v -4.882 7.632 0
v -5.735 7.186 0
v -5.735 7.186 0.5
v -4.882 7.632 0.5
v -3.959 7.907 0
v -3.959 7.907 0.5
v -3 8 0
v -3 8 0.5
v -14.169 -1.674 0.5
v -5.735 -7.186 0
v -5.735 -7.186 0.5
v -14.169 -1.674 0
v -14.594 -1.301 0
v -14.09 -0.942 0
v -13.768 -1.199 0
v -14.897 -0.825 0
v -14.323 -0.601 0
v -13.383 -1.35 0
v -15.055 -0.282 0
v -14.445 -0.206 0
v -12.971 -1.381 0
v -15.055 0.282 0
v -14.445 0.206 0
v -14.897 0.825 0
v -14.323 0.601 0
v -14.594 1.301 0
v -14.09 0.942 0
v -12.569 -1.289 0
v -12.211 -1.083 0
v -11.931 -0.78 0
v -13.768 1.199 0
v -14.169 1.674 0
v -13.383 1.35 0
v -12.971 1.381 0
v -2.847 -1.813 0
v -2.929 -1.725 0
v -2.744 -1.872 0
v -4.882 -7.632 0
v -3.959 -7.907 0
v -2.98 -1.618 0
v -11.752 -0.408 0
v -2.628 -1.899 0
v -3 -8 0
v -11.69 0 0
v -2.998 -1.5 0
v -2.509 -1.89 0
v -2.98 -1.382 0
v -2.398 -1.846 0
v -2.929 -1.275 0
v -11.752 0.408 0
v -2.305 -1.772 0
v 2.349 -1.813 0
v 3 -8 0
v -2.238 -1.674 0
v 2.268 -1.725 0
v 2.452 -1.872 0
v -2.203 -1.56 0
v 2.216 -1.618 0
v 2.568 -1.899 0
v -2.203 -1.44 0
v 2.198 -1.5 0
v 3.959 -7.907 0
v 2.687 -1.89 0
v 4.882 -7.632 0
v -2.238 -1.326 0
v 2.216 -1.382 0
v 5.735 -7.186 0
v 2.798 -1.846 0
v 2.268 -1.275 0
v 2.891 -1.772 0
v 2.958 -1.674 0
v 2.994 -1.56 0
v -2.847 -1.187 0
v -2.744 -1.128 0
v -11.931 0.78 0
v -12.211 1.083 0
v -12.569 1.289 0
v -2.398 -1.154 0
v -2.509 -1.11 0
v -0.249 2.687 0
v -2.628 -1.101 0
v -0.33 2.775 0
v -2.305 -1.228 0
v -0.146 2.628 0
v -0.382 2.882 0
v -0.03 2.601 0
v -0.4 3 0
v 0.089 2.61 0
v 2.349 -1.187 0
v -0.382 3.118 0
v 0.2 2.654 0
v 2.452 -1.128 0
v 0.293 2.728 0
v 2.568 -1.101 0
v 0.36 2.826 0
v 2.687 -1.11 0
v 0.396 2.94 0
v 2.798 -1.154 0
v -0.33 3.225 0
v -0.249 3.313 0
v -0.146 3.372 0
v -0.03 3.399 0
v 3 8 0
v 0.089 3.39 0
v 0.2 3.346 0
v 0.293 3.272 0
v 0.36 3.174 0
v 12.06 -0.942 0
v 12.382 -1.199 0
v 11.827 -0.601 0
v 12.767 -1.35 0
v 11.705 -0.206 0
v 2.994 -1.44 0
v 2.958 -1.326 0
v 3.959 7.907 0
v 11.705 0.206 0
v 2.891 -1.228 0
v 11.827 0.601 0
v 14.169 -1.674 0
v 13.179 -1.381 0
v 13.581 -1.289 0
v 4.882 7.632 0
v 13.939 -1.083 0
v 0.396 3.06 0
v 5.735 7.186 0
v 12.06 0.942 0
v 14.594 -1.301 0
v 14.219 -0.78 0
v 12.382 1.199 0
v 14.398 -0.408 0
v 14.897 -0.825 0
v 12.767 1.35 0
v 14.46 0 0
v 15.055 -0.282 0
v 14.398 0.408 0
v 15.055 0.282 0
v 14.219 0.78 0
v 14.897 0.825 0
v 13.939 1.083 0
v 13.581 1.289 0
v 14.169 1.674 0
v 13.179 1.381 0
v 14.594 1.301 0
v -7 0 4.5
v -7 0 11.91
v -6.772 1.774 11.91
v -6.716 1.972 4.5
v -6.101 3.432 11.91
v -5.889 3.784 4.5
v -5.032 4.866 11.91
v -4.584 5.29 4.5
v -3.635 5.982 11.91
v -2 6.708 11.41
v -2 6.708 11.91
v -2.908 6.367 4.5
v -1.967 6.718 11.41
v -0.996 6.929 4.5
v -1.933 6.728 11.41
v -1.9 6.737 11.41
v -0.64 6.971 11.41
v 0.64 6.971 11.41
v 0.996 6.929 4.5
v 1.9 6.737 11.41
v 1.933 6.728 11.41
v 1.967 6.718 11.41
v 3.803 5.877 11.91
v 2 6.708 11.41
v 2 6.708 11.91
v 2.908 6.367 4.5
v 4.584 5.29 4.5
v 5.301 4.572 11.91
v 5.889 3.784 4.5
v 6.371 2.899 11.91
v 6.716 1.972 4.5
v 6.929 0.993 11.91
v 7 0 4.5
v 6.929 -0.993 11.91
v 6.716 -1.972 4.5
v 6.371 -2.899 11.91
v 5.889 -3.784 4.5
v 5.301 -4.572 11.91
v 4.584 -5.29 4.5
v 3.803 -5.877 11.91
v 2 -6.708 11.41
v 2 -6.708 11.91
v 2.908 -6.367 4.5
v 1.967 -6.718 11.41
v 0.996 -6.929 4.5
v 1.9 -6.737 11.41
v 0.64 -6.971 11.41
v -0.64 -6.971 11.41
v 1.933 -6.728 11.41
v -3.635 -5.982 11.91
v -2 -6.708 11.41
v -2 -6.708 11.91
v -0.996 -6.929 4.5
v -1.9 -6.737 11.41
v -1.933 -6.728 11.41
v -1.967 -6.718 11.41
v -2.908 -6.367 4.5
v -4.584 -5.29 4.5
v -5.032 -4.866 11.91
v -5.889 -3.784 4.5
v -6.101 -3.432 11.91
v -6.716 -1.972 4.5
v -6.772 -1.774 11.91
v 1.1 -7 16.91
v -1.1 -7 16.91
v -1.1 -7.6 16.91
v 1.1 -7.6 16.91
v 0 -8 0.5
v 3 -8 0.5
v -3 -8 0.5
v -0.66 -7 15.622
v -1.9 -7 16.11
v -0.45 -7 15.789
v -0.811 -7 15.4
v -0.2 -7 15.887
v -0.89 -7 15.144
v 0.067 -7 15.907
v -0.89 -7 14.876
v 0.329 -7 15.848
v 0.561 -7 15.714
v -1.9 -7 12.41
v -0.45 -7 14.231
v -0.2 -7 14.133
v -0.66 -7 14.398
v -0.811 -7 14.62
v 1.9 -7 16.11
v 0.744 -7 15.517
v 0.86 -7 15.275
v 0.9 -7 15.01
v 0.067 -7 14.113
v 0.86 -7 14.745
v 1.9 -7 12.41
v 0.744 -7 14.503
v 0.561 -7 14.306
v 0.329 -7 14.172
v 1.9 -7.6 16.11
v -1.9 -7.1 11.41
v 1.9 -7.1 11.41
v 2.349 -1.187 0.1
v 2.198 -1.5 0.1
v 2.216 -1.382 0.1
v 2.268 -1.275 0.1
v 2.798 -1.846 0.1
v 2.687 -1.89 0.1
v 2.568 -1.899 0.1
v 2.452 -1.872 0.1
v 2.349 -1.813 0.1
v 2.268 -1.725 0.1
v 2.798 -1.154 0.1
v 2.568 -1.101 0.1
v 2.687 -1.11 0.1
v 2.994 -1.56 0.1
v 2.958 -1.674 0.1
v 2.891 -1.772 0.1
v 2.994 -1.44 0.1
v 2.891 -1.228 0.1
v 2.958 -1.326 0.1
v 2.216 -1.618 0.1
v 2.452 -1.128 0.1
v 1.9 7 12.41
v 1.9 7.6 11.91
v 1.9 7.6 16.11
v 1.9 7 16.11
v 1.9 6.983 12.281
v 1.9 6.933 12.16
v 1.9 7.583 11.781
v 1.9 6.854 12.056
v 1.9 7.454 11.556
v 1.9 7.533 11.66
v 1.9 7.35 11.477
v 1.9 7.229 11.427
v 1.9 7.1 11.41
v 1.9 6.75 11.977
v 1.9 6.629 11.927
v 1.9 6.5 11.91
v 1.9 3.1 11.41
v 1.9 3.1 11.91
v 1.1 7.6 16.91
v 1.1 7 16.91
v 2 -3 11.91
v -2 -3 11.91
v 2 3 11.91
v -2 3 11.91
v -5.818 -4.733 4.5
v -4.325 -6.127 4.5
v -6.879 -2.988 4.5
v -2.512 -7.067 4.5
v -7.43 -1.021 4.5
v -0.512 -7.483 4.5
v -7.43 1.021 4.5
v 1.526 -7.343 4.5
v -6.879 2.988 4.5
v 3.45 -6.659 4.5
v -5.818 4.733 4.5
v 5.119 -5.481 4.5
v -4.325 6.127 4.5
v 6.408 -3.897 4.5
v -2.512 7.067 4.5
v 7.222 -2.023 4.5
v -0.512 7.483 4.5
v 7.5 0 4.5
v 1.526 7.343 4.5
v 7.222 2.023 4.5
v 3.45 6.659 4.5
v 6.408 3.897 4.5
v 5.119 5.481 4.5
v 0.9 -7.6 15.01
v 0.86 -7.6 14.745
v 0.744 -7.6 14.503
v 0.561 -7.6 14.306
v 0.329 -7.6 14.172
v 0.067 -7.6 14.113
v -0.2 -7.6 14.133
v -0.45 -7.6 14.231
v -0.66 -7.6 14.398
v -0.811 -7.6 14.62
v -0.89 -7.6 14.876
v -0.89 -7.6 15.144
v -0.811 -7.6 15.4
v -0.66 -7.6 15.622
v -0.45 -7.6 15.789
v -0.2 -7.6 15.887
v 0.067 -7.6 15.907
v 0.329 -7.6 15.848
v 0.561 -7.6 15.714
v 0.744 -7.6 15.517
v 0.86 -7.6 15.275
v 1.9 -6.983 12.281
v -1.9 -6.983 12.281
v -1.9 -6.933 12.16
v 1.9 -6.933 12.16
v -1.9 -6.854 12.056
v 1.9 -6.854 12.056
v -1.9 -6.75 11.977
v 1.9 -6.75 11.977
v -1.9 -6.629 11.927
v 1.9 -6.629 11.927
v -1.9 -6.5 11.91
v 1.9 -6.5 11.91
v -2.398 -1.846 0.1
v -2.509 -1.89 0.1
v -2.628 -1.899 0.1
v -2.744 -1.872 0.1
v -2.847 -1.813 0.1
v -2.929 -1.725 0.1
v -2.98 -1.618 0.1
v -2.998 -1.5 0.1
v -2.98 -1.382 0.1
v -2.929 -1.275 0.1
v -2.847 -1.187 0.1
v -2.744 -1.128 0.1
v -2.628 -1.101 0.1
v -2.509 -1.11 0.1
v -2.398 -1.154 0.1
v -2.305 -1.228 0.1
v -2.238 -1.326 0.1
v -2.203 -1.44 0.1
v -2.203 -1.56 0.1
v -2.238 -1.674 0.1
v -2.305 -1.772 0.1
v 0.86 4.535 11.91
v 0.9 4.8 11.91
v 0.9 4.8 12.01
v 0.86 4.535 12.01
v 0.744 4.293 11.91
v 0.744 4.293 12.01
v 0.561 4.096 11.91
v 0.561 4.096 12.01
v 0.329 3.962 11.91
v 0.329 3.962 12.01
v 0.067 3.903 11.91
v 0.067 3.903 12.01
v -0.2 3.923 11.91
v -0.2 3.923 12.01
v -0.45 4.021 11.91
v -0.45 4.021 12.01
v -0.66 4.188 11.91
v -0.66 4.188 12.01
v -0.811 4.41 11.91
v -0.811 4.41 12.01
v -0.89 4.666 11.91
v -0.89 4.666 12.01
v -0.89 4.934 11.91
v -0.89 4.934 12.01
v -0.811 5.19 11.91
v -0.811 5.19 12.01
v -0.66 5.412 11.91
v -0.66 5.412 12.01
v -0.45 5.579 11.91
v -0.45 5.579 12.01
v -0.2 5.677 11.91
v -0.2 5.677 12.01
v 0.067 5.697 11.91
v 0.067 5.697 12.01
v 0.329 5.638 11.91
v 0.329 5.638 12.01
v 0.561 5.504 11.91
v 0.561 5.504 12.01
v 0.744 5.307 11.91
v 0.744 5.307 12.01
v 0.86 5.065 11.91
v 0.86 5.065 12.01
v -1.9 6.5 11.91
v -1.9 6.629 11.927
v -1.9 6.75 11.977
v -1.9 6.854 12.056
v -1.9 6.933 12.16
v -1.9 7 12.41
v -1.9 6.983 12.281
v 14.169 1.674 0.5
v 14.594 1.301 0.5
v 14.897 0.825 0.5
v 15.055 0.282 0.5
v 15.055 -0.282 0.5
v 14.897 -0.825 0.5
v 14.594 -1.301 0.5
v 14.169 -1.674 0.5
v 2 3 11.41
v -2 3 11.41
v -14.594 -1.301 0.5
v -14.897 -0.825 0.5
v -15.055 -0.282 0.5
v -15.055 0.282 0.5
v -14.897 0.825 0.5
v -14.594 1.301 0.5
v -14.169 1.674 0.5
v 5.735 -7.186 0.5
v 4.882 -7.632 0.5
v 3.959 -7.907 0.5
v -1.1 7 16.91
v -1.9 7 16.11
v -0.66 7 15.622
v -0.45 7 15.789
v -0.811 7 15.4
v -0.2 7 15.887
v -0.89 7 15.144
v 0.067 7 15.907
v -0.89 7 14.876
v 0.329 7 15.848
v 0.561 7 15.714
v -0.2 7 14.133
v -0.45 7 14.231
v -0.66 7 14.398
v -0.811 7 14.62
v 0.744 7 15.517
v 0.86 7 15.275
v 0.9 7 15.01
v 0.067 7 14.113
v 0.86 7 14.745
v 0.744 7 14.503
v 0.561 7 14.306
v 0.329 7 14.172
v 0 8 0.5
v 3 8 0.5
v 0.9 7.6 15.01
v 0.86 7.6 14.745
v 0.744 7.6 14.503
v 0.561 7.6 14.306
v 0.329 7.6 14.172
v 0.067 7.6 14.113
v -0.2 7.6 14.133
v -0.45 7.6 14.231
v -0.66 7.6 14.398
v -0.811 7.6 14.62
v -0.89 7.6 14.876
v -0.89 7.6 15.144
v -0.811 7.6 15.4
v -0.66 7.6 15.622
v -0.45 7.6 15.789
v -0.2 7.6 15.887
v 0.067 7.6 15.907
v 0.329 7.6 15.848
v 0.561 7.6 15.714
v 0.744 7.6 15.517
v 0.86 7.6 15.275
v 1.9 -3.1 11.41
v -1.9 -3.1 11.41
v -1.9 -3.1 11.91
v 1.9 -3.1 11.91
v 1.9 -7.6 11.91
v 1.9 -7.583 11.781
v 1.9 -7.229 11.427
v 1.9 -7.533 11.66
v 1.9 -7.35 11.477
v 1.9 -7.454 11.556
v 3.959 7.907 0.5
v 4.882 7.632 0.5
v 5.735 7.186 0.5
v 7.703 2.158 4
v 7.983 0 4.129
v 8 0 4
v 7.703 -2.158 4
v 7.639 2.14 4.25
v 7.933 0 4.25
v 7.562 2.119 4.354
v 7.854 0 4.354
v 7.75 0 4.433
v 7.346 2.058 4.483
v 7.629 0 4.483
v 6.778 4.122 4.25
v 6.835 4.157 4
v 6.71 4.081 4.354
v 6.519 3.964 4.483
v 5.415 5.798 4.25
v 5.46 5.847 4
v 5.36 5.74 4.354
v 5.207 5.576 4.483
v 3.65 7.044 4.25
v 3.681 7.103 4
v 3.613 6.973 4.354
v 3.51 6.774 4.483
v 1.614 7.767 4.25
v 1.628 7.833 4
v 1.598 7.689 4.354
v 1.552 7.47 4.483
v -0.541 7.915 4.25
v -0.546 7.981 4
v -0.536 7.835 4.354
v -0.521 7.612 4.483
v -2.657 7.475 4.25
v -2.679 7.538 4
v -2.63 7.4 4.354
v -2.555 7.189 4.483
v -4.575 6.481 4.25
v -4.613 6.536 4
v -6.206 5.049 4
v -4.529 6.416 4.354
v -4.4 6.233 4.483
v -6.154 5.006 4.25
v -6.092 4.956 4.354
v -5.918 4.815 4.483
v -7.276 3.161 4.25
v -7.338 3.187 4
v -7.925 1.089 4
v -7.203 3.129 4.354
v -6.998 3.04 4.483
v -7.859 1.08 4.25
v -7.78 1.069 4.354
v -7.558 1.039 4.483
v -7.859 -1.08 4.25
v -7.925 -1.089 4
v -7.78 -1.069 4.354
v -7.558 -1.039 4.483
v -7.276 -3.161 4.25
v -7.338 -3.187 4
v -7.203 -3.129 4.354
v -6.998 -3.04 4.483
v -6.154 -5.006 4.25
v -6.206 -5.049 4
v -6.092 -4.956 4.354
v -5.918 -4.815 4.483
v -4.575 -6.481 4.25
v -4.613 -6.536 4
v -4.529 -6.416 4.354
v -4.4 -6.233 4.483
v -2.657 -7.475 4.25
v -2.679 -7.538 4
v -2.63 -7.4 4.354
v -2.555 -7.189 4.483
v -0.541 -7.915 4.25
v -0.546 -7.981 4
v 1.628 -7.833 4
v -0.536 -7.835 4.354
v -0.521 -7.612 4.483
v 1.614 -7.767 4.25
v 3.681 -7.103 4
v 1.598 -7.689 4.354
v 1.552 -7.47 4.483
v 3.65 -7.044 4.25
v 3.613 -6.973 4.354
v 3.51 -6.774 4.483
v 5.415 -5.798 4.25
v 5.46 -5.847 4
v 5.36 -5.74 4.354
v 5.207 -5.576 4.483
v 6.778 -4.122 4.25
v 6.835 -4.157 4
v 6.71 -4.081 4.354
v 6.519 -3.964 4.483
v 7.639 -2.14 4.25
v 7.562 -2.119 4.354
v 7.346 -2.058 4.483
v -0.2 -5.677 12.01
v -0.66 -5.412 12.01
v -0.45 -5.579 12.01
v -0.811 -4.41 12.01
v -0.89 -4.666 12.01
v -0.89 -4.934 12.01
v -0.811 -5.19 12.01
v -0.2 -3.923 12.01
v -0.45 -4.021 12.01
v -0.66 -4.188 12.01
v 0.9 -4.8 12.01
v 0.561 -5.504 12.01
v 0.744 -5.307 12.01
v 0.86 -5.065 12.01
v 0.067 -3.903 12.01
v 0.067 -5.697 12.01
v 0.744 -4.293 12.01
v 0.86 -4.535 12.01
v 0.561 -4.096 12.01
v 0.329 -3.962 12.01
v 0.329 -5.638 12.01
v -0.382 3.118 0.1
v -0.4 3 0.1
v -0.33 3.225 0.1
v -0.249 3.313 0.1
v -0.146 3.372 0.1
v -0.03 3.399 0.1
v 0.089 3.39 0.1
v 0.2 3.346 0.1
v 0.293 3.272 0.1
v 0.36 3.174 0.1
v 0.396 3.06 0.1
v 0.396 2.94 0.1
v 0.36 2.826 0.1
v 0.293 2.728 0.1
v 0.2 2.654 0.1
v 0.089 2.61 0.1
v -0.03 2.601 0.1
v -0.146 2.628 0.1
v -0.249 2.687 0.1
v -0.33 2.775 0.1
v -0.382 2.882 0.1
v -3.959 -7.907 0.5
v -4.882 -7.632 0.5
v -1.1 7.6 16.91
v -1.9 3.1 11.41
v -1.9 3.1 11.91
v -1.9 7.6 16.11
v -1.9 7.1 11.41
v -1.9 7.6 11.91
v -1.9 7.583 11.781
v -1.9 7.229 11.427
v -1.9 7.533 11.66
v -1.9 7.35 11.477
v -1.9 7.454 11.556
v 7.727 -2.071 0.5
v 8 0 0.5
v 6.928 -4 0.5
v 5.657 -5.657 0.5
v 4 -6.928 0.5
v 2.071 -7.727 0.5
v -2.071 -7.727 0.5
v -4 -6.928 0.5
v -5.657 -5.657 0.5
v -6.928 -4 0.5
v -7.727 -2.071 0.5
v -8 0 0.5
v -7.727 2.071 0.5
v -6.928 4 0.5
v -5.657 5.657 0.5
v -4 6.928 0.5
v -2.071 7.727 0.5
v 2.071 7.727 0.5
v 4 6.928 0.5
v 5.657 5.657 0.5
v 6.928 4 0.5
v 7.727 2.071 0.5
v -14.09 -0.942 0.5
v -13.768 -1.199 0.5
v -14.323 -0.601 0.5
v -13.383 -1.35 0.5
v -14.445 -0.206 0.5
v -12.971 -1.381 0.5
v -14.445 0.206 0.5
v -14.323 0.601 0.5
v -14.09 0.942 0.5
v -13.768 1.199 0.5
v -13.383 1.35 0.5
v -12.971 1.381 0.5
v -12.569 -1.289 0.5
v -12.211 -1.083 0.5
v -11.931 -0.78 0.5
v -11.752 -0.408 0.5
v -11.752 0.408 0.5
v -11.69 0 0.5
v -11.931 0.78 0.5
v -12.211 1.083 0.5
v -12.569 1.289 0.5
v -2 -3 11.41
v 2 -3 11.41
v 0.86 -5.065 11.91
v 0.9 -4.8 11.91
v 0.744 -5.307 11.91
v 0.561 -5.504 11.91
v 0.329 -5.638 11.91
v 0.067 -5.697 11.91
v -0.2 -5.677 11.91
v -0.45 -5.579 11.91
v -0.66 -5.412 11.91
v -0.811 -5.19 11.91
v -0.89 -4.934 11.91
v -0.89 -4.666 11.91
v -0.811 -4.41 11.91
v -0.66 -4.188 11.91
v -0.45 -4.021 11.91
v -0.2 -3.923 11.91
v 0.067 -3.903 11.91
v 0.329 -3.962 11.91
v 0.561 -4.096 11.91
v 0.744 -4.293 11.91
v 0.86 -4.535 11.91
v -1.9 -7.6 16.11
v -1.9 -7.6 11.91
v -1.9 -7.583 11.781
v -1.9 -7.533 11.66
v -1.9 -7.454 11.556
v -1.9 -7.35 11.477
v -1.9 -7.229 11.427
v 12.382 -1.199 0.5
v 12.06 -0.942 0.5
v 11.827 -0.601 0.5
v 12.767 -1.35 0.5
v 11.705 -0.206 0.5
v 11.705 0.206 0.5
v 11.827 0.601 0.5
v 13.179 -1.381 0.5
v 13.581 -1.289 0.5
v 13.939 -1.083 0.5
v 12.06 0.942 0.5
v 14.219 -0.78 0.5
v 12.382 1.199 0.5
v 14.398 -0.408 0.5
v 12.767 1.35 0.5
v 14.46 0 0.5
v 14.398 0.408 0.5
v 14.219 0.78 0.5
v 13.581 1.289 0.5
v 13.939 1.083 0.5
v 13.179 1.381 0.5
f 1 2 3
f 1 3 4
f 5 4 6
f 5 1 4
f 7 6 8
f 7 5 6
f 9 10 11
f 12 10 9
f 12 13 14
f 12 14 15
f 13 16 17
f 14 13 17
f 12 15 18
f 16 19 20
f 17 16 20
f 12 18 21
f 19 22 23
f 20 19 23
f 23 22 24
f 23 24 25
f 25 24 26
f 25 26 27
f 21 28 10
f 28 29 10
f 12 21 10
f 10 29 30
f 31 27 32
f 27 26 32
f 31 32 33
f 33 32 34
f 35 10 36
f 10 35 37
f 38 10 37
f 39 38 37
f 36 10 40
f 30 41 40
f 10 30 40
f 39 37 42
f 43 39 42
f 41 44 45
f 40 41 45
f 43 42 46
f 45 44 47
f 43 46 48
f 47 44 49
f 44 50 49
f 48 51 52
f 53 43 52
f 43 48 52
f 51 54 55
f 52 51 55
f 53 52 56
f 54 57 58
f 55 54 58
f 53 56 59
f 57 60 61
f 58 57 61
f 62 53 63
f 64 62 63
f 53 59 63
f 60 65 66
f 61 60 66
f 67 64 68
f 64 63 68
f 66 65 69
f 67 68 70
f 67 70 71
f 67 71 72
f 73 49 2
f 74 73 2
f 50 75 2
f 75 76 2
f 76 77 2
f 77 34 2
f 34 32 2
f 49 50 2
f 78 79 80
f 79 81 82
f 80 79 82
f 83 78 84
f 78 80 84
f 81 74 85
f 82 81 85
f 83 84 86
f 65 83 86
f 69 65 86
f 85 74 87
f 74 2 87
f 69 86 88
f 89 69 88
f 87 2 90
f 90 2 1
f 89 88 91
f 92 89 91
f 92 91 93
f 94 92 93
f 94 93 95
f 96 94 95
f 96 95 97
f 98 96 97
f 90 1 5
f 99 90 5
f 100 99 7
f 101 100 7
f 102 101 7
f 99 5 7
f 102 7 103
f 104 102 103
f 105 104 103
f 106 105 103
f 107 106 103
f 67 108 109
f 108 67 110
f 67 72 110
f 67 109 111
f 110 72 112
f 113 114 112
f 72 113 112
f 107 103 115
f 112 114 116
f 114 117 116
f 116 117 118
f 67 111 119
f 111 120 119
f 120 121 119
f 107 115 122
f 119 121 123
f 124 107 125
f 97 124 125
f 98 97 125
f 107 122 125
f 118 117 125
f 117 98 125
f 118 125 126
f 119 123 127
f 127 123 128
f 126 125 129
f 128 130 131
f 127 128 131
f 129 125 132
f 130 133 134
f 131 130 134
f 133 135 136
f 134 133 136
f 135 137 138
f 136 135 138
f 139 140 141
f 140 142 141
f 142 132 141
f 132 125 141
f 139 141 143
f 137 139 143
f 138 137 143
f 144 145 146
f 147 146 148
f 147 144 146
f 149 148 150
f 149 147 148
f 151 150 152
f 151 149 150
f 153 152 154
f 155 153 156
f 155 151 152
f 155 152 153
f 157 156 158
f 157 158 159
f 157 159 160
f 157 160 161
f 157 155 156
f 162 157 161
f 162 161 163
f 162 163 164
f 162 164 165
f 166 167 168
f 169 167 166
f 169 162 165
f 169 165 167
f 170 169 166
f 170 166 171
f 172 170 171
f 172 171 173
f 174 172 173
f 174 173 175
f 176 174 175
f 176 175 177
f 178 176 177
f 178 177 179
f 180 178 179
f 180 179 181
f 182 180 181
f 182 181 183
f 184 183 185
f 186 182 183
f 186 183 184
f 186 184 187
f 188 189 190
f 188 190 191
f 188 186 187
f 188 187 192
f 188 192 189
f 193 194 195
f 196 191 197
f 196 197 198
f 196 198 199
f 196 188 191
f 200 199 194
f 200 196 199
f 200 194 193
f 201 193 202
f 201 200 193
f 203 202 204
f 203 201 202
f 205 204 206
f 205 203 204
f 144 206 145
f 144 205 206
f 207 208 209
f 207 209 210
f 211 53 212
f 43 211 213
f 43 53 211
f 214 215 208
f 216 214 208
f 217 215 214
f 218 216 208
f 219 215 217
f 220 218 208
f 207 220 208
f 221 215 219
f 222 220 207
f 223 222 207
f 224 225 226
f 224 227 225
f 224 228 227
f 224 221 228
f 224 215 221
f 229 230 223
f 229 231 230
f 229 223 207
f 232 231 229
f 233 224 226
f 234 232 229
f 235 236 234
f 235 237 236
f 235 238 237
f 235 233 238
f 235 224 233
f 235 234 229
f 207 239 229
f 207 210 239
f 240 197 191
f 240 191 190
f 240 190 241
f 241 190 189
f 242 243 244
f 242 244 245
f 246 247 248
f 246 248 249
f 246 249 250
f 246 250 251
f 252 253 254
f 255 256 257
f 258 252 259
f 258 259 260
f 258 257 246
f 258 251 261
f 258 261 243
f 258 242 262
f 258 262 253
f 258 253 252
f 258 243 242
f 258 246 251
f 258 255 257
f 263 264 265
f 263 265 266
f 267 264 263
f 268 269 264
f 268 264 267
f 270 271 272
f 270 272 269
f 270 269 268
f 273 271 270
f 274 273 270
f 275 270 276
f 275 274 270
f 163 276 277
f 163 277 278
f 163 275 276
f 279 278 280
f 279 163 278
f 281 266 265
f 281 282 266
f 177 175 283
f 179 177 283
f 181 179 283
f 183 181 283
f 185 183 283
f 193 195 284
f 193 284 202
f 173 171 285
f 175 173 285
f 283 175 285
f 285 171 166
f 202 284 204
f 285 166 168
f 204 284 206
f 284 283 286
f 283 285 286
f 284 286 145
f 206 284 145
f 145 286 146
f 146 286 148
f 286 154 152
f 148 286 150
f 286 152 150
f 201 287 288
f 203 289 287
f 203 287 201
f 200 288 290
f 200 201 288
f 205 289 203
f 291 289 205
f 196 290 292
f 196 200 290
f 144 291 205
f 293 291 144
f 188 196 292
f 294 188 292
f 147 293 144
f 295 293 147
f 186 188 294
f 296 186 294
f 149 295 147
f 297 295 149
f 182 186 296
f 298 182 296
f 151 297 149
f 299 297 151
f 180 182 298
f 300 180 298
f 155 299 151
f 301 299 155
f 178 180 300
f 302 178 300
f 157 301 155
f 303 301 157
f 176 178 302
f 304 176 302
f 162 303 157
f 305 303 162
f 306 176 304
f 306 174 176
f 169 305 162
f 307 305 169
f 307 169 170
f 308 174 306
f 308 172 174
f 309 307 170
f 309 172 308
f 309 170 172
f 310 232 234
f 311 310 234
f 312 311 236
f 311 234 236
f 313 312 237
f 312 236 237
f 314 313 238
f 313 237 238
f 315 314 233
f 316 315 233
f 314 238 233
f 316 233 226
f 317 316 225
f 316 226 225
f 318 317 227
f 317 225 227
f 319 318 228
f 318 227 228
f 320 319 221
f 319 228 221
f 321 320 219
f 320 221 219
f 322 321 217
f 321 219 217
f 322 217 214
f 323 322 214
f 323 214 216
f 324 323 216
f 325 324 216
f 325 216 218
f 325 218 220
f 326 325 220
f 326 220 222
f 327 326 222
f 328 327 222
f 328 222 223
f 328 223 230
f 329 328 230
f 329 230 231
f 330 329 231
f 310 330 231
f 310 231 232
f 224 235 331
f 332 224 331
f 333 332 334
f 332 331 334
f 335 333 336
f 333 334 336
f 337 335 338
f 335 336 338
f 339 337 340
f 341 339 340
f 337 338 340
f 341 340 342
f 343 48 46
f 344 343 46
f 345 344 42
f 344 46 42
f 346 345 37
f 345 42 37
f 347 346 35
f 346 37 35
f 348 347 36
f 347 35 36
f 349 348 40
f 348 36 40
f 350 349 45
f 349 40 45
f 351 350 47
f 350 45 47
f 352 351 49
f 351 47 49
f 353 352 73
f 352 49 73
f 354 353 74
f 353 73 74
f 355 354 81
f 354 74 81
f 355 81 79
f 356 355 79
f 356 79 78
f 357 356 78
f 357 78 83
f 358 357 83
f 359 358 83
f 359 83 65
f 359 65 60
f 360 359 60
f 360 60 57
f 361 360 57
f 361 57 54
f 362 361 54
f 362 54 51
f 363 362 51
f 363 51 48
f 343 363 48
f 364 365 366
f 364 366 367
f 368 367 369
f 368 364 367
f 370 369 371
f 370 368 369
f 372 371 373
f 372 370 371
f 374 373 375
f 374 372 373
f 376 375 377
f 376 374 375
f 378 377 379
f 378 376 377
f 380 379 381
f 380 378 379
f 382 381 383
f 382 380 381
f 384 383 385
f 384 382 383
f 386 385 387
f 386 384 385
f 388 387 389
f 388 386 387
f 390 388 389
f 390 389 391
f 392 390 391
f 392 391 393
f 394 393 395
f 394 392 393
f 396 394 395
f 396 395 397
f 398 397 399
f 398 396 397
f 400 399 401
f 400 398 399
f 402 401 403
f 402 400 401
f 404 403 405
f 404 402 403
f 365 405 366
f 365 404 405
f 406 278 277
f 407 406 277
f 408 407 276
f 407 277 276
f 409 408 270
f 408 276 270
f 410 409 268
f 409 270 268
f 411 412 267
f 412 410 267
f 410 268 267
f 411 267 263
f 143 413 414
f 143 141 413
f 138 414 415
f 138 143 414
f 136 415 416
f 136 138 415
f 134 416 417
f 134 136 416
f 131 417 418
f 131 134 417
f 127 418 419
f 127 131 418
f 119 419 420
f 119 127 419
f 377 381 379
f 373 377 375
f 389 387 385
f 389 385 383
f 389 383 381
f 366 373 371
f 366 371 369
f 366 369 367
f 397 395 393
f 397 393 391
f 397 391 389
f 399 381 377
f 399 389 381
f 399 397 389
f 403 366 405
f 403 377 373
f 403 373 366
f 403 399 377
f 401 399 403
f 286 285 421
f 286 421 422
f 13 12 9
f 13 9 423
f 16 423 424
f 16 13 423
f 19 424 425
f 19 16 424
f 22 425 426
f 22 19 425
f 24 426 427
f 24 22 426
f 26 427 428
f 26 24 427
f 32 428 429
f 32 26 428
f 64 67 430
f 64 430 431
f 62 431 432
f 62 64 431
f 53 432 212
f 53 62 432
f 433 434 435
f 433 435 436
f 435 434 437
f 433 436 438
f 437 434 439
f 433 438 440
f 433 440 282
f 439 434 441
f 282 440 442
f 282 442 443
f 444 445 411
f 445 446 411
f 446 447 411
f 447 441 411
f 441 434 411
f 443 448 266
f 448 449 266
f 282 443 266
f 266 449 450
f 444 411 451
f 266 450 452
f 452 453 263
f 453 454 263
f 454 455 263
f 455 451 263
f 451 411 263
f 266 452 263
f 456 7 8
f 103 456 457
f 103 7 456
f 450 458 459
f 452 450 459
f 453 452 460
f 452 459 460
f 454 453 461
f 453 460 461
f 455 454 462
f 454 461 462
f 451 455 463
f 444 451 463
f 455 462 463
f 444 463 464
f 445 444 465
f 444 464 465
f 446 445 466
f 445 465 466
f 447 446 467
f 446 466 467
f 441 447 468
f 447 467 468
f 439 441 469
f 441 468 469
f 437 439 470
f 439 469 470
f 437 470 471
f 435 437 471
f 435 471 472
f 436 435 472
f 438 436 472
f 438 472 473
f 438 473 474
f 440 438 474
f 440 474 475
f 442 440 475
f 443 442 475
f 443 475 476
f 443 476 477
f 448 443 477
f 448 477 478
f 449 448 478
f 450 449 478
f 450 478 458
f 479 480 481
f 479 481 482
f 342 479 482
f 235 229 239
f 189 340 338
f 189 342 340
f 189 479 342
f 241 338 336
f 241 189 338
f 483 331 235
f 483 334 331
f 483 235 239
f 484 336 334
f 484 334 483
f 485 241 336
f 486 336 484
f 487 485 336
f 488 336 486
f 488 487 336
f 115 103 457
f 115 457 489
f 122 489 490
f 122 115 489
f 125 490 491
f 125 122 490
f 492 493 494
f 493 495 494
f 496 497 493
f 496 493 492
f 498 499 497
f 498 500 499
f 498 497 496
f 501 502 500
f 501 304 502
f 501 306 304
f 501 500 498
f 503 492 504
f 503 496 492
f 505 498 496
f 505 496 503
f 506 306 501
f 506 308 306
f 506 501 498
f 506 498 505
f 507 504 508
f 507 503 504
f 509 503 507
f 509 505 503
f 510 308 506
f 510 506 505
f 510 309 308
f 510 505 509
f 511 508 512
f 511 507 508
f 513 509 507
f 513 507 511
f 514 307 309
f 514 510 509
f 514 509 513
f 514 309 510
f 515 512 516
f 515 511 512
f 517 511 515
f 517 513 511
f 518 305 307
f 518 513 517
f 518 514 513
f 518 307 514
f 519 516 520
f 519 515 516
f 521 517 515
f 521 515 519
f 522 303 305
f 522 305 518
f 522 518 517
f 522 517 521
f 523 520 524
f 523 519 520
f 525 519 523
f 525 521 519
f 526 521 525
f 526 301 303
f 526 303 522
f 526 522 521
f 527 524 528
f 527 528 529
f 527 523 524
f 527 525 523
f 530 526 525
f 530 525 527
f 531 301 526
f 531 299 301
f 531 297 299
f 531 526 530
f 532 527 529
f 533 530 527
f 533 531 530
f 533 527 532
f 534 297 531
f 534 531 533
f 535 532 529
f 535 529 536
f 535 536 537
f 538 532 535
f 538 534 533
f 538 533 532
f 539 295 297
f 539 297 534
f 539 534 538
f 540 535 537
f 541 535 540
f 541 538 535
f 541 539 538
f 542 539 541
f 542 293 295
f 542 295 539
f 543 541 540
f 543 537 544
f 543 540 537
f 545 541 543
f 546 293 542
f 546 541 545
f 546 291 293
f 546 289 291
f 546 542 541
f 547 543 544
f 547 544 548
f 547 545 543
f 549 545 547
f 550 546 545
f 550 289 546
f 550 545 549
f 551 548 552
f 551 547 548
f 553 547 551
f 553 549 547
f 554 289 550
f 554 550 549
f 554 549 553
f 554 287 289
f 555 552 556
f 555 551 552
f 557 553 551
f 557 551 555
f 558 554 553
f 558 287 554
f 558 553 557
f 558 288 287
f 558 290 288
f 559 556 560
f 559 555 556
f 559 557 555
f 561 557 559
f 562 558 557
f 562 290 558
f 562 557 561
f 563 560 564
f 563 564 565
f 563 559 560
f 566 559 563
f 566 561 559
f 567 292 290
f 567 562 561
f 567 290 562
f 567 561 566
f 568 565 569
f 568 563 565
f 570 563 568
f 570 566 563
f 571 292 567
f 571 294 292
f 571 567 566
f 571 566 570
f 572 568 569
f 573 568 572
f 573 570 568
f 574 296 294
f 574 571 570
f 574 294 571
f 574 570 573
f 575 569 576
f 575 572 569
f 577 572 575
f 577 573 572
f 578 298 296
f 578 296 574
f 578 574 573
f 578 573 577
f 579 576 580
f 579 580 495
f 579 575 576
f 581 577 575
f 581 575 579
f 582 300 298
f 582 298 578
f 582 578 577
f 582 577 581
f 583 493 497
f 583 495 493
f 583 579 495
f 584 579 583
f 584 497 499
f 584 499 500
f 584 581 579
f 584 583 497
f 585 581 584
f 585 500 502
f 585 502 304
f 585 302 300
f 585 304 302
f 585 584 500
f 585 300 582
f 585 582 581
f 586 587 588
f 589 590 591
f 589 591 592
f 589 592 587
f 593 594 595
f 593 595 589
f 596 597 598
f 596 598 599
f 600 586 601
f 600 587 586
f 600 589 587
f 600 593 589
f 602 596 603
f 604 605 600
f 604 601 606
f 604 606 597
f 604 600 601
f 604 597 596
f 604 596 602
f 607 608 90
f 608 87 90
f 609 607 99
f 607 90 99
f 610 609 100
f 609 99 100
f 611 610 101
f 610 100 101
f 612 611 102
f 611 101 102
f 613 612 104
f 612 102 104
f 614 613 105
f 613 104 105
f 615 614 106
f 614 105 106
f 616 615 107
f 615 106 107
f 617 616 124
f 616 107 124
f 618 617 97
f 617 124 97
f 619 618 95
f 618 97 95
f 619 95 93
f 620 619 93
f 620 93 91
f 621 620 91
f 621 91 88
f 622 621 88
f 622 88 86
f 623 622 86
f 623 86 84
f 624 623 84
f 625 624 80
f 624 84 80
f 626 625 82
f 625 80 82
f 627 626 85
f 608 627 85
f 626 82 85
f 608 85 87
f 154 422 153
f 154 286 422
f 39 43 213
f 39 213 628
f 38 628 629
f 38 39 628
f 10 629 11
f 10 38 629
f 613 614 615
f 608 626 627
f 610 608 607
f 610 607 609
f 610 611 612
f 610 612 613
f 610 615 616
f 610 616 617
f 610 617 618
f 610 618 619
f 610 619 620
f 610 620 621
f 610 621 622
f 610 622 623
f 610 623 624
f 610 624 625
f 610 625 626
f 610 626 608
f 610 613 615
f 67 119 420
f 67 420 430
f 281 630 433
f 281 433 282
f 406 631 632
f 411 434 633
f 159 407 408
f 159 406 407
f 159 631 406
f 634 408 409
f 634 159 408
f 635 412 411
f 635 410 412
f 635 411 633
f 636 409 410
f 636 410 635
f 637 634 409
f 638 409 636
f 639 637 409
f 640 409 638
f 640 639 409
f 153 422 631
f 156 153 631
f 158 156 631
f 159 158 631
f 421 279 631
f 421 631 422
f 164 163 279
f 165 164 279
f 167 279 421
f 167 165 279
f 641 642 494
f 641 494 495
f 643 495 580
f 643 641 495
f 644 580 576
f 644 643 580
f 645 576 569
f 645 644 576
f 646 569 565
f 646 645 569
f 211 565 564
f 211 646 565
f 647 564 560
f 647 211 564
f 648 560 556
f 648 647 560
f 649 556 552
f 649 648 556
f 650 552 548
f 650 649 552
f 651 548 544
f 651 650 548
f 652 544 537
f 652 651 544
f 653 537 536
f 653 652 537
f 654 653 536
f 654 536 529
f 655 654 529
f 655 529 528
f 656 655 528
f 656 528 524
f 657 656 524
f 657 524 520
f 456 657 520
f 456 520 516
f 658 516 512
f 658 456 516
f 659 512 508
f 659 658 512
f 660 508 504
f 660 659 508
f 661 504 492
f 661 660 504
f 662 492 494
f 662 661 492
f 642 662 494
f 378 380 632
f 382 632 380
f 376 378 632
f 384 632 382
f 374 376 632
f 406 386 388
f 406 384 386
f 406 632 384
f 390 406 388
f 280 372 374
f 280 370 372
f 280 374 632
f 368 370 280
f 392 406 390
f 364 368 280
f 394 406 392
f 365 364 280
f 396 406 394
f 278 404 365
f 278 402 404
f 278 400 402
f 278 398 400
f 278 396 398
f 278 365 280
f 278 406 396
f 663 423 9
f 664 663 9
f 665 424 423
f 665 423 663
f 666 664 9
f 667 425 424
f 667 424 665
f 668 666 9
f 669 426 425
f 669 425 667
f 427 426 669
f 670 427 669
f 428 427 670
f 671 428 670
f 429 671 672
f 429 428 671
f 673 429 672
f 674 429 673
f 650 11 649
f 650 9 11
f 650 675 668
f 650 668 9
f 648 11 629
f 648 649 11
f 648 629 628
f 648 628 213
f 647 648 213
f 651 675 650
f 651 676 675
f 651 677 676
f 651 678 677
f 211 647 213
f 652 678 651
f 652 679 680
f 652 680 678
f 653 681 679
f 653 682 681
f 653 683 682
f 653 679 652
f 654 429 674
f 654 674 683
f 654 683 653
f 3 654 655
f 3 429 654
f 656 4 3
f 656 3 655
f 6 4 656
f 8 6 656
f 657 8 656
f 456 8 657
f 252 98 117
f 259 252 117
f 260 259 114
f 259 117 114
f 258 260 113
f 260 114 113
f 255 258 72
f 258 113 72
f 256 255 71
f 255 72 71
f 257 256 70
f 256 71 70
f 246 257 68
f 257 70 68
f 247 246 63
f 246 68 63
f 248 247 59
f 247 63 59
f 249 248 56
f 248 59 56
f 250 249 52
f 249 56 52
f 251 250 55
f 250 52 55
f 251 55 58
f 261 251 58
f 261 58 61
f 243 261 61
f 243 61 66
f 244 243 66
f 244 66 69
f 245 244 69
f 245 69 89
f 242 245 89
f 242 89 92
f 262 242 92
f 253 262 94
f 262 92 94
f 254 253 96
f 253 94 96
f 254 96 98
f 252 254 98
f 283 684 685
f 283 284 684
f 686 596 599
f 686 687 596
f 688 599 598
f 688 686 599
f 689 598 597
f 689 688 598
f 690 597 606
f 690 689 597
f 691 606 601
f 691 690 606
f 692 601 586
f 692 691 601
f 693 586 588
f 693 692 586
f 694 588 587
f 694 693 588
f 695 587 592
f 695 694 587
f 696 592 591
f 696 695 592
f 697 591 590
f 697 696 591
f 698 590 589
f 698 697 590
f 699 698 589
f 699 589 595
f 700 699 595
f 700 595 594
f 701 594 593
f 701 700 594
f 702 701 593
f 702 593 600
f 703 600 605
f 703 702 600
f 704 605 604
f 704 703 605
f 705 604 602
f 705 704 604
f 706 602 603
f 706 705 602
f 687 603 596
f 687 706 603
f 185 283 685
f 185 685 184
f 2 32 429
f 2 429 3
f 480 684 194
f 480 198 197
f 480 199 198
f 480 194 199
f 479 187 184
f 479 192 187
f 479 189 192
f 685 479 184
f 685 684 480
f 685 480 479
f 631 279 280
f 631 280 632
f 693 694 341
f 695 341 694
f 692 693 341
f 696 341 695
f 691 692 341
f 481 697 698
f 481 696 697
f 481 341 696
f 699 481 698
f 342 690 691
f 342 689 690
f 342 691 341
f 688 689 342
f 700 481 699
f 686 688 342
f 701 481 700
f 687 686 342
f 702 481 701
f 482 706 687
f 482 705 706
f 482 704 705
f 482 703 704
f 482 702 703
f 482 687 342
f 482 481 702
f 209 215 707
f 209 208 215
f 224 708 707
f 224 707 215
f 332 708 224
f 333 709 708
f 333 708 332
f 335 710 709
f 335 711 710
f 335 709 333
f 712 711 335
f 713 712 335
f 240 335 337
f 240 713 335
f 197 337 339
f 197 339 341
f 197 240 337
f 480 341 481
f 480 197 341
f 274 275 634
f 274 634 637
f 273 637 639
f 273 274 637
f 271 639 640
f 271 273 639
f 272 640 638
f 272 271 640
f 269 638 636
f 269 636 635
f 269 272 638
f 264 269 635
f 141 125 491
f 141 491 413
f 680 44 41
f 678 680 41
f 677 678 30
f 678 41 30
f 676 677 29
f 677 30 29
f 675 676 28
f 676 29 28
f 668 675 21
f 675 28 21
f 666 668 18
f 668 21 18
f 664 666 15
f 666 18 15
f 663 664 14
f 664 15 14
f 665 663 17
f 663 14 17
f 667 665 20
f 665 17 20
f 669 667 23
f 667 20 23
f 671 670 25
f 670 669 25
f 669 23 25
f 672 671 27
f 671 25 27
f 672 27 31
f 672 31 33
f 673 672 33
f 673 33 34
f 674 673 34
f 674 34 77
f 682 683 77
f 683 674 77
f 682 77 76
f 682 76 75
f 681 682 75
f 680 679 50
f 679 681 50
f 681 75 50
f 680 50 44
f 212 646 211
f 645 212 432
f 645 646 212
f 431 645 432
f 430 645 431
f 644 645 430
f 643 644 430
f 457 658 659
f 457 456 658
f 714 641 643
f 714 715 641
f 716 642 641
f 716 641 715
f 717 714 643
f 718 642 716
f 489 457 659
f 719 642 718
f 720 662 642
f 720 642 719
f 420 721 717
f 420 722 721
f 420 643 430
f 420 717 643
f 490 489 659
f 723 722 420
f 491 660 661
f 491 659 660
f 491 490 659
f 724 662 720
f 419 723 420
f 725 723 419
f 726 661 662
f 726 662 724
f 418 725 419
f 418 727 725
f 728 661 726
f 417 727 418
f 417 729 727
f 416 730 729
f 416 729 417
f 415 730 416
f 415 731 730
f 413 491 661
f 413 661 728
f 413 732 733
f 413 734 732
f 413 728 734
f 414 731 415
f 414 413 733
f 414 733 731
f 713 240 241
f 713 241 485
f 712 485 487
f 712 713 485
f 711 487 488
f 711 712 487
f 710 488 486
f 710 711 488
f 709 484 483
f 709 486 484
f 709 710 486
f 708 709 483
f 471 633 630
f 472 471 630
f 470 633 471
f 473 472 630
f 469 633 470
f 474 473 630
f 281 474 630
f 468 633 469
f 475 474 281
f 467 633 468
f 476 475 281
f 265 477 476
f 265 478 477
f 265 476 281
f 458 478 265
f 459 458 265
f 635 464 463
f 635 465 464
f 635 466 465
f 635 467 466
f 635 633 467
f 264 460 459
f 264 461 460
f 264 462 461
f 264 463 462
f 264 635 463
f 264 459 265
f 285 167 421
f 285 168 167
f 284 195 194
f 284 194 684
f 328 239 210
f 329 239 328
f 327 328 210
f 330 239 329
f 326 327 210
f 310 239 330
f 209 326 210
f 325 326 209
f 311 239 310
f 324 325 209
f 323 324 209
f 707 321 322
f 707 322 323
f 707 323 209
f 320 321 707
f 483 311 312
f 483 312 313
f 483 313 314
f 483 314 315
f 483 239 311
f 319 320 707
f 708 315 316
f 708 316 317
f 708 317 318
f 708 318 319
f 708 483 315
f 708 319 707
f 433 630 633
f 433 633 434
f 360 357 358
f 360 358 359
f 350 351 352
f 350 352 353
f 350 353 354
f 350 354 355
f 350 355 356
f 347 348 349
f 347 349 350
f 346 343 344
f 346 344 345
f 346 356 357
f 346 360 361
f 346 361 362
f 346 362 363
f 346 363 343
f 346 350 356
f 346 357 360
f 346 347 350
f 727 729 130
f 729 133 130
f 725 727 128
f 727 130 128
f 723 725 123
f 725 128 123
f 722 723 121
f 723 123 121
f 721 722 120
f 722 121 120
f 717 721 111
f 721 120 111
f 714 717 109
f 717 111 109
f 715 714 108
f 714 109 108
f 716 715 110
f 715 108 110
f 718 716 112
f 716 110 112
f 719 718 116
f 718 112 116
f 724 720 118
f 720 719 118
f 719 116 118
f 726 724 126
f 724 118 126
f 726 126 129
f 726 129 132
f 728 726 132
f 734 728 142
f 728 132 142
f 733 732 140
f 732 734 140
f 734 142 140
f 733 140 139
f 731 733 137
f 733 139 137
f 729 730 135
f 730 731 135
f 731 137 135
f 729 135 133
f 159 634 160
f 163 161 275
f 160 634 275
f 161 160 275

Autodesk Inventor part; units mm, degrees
ref_plane "YZ Plane" through (0, 0, 0) normal (1, 0, 0) x (0, 1, 0)
ref_plane "XZ Plane" through (0, 0, 0) normal (0, 1, 0) x (-1, 0, 0)
ref_plane "XY Plane" through (0, 0, 0) normal (0, 0, 1) x (1, 0, 0)
sketch "Skizze1" plane through (0, 0, 0) normal (0, 0, 1) x (1, 0, 0)
  line L0 (-3, 8) -> (3, 8)
  line L1 (5.7352, 7.1856) -> (14.1691, 1.6742)
  line L2 (14.1691, -1.6742) -> (5.7352, -7.1856)
  line L3 (3, -8) -> (-3, -8)
  line L4 (-5.7352, -7.1856) -> (-14.1691, -1.6742)
  line L5 (-14.1691, 1.6742) -> (-5.7352, 7.1856)
  arc A0 (14.1691, -1.6742) -> (14.1691, 1.6742) centre (13.075, 0) ccw
  arc A1 (-14.1691, 1.6742) -> (-14.1691, -1.6742) centre (-13.075, 0) ccw
  circle A2 centre (0, 0) radius 7
  circle A3 centre (-13.075, 0) radius 1.385
  circle A4 centre (13.075, 0) radius 1.385
  arc A5 (-3, 8) -> (-5.7352, 7.1856) centre (-3, 3) ccw
  arc A6 (5.7352, 7.1856) -> (3, 8) centre (3, 3) ccw
  arc A7 (3, -8) -> (5.7352, -7.1856) centre (3, -3) ccw
  arc A8 (-5.7352, -7.1856) -> (-3, -8) centre (-3, -3) ccw
  dimension "d0" = 16
  dimension "d1" = 8
  dimension "d3" = 2
  dimension "d4" = 14
  dimension "d5" = 30.15
  dimension "d7" = 2.77
  dimension "d8" = 2.77
  dimension "d9" = 13.075
  dimension "d10" = 13.075
  dimension "d11" = 5
  dimension "d12" = 6
  dimension "d13" = 6
  dimension "d14" = 3
  dimension "d15" = 3
extrude "Extrusion1" add sketch "Skizze1" along normal blind 0.5
sketch "Skizze2" plane through (0, 0, 0.5) normal (0, 0, 1) x (1, 0, 0)
  circle A0 centre (0, 0) radius 8
  circle A1 centre (0, 0) radius 7
  dimension "d18" = 16
  dimension "d19" = 14
extrude "Extrusion2" add sketch "Skizze2" along normal blind 4
fillet "Rundung1" radius 0.5 1 edges at (-8, 0, 4.5)
sketch "Skizze3" plane through (0, 0, 0) normal (0, 0, -1) x (-1, 0, 0)
  circle A0 centre (0, 0) radius 7
  dimension "d23" = 14
extrude "Extrusion3" add sketch "Skizze3" against normal blind 11.91
sketch "Skizze4" plane through (0, 0, 0) normal (0, 0, -1) x (-1, 0, 0)
  circle A0 centre (0, 3) radius 0.4
  point P0 (0, 0)
  dimension "d26" = 3
  dimension "d27" = 0.8
extrude "Extrusion4" cut sketch "Skizze4" against normal blind 0.1
pattern_circular "Runde Anordnung1" count 3 over 360 about axis through (0, 0, -10) along (0, 0, 1) of "Extrusion4"
sketch "Skizze5" plane through (0, 0, 11.91) normal (0, 0, 1) x (1, 0, 0)
  line L0 (2, -9) -> (-2, -9)
  line L1 (-2, -9) -> (-2, -3)
  line L2 (-2, -3) -> (2, -3)
  line L3 (2, -3) -> (2, -9)
  line L4 (2, 3) -> (-2, 3)
  line L5 (-2, 3) -> (-2, 9)
  line L6 (-2, 9) -> (2, 9)
  line L7 (2, 9) -> (2, 3)
  line L8 (3, 8) -> (0, 8) projected
  line L9 (0, -8) -> (3, -8) projected
  point P0 (0, 0)
  dimension "d33" = 4
  dimension "d34" = 2
  dimension "d35" = 3
  dimension "d36" = 3
  dimension "d37" = 1
  dimension "d38" = 1
extrude "Extrusion5" cut sketch "Skizze5" against normal blind 0.5
sketch "Skizze6" plane through (0, 0, 11.41) normal (0, 0, 1) x (1, 0, 0)
  line L0 (1.9, -7.6) -> (-1.9, -7.6)
  line L1 (-1.9, -7.6) -> (-1.9, -3.1)
  line L2 (-1.9, -3.1) -> (1.9, -3.1)
  line L3 (1.9, -3.1) -> (1.9, -7.6)
  line L4 (-2, -3) -> (2, -3) projected
  line L5 (1.9, 3.1) -> (-1.9, 3.1)
  line L6 (-1.9, 3.1) -> (-1.9, 7.6)
  line L7 (-1.9, 7.6) -> (1.9, 7.6)
  line L8 (1.9, 7.6) -> (1.9, 3.1)
  line L9 (2, 3) -> (-2, 3) projected
  point P0 (0, 0)
  dimension "d41" = 3.8
  dimension "d42" = 1.9
  dimension "d43" = 0.1
  dimension "d44" = 4.5
  dimension "d45" = 3.8
  dimension "d46" = 1.9
  dimension "d47" = 0.1
  dimension "d48" = 4.5
extrude "Extrusion6" add sketch "Skizze6" along normal blind 0.5
sketch "Skizze7" plane through (0, 0, 11.91) normal (0, 0, 1) x (1, 0, 0)
  line L0 (1.9, 7.6) -> (-1.9, 7.6) projected
  line L1 (-1.9, 7.6) -> (-1.9, 3.1) projected
  line L2 (1.9, 7.6) -> (-1.9, 7.6)
  line L3 (-1.9, 7.6) -> (-1.9, 7)
  line L4 (-1.9, 7) -> (1.9, 7)
  line L5 (1.9, 7) -> (1.9, 7.6)
  line L6 (-1.9, -7.6) -> (1.9, -7.6) projected
  line L7 (-1.9, -3.1) -> (-1.9, -7.6) projected
  line L8 (1.9, -7.6) -> (-1.9, -7.6)
  line L9 (-1.9, -7.6) -> (-1.9, -7)
  line L10 (-1.9, -7) -> (1.9, -7)
  line L11 (1.9, -7) -> (1.9, -7.6)
  point P0 (0, 0)
  dimension "d51" = 0.6
  dimension "d52" = 0.6
extrude "Extrusion7" add sketch "Skizze7" along normal blind 5
chamfer "Fase1" distance 0.8 angle 45 4 edges at (-1.9, 7.3, 16.91) (1.9, 7.3, 16.91) (-1.9, -7.3, 16.91) (1.9, -7.3, 16.91)
fillet "Rundung2" radius 0.5 4 edges at (0, 7.6, 11.41) (0, -7.6, 11.41) (0, -7, 11.91) (0, 7, 11.91)
sketch "Skizze8" plane through (-1.1, 7.6, 16.91) normal (0, 1, 0) x (1, 0, 0)
  circle A0 centre (1.1, 1.9) radius 0.9
  line L0 (2.2, 0) -> (0, 0) projected
  point P0 (1.1, 16.91)
  dimension "d59" = 1.8
  dimension "d60" = 1.9
extrude "Extrusion8" cut sketch "Skizze8" against normal blind 20
sketch "Skizze9" plane through (0, 0, 11.91) normal (0, 0, 1) x (1, 0, 0)
  circle A0 centre (0, 4.8) radius 0.9
  circle A1 centre (0, -4.8) radius 0.9
  point P0 (0, 0)
  dimension "d63" = 1.8
  dimension "d64" = 1.8
  dimension "d65" = 4.8
  dimension "d66" = 4.8
extrude "Extrusion9" add sketch "Skizze9" along normal blind 0.1
properties part number "Bimetallschalter"
